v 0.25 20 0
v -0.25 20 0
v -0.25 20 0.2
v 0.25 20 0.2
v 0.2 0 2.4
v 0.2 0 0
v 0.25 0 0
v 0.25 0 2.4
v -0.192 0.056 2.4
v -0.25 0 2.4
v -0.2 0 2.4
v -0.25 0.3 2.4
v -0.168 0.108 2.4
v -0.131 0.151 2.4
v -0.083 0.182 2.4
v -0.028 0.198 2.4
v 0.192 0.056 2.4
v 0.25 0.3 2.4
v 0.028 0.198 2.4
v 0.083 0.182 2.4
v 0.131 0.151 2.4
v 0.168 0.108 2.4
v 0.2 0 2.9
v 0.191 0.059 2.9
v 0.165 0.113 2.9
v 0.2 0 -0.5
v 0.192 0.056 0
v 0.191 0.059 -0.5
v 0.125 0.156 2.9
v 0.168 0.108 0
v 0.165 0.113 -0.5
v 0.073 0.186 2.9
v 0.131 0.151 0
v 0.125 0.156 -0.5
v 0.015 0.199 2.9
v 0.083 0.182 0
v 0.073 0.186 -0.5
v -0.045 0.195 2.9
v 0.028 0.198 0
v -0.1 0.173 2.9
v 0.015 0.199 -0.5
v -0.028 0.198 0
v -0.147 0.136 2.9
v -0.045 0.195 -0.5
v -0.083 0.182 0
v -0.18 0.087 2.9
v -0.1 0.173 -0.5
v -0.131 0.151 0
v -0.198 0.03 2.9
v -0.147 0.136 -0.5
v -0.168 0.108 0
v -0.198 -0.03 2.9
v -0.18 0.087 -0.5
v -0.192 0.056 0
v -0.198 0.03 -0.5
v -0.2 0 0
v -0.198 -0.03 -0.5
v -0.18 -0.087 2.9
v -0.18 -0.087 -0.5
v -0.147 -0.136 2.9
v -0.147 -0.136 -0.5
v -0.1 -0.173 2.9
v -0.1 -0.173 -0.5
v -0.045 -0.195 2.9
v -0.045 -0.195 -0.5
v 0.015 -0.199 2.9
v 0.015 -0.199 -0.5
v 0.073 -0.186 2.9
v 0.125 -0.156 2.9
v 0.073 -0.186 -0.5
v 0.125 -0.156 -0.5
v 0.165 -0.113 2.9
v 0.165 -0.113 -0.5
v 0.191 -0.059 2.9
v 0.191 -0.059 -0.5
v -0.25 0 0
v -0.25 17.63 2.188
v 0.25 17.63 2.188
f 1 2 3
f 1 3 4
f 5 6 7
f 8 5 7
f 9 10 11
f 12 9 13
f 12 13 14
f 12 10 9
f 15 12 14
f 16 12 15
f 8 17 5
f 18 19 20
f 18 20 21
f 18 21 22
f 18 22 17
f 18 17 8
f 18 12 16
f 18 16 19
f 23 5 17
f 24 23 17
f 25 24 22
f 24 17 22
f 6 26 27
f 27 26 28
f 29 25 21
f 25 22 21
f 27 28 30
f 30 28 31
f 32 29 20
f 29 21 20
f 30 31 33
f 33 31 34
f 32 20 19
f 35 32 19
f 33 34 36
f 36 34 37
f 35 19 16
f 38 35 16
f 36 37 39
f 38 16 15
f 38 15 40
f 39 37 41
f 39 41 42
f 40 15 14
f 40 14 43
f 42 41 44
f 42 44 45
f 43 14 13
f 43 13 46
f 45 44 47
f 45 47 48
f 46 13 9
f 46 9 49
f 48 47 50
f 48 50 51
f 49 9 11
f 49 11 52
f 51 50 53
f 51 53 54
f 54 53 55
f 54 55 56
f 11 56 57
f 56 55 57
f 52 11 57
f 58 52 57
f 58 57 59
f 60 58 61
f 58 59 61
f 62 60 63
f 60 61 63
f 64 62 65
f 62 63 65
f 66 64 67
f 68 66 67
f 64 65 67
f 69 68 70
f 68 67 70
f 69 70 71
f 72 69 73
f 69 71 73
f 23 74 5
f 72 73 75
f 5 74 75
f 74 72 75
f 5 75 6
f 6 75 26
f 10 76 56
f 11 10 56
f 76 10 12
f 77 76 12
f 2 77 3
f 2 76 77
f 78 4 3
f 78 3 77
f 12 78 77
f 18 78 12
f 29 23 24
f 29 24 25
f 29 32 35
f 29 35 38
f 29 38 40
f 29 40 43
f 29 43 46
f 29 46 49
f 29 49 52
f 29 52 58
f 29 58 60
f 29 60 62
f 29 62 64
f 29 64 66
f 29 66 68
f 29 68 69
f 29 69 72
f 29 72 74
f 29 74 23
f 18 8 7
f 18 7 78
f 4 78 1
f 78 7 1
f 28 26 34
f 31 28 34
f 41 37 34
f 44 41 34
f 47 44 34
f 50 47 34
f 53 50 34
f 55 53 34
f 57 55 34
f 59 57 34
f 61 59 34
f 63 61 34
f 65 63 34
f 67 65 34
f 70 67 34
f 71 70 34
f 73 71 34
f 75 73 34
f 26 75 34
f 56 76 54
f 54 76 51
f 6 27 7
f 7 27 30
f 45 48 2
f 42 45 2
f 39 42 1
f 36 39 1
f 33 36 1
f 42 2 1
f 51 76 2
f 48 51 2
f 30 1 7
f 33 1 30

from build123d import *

# Parameters (mm, degrees)
SKETCH1_W                = 0.5
SKETCH1_H                = 20
BOSS_EXTRUDE1_DEPTH      = 2.4
BOSS_EXTRUDE2_DEPTH      = 0.5
BOSS_EXTRUDE2_DEPTH_BACK = 2.9
SKETCH2_R                = 0.2
CUT_EXTRUDE1_REACH       = 22.215


with BuildPart() as part:
    # Sketch1 → Boss-Extrude1 (new body)
    with BuildSketch(Plane.XY):
        with Locations((0, 10)):
            Rectangle(SKETCH1_W, SKETCH1_H)
    extrude(amount=BOSS_EXTRUDE1_DEPTH)

    # Sketch2 → Boss-Extrude2 (add, two sides: drawn at the far end of the back side and taken through both)
    with BuildSketch(Plane.XY.offset(2.4).offset(-BOSS_EXTRUDE2_DEPTH_BACK)):
        Circle(SKETCH2_R)
    extrude(amount=BOSS_EXTRUDE2_DEPTH + BOSS_EXTRUDE2_DEPTH_BACK)

    # Sketch3 → Cut-Extrude1 (cut, up to next)
    with BuildSketch(Plane(origin=(0.25, 0, 0), x_dir=(0, 0, -1), z_dir=(1, 0, 0)), mode=Mode.PRIVATE) as cut_extrude1_sk1:
        Polygon((-2.4, 0.3), (-3.130095712, 0.3), (-3.130095712, 41.705801687), (-0.2, 41.705801687), (-0.2, 20), (-2.188257625, 17.630486832), align=None)
    cut_extrude1_tool1 = extrude(cut_extrude1_sk1.sketch, amount=-CUT_EXTRUDE1_REACH, mode=Mode.PRIVATE) & part.part
    add(cut_extrude1_tool1.solids().sort_by_distance((0.25, 26.424814, 1.871))[0], mode=Mode.SUBTRACT)


solid = part.part
